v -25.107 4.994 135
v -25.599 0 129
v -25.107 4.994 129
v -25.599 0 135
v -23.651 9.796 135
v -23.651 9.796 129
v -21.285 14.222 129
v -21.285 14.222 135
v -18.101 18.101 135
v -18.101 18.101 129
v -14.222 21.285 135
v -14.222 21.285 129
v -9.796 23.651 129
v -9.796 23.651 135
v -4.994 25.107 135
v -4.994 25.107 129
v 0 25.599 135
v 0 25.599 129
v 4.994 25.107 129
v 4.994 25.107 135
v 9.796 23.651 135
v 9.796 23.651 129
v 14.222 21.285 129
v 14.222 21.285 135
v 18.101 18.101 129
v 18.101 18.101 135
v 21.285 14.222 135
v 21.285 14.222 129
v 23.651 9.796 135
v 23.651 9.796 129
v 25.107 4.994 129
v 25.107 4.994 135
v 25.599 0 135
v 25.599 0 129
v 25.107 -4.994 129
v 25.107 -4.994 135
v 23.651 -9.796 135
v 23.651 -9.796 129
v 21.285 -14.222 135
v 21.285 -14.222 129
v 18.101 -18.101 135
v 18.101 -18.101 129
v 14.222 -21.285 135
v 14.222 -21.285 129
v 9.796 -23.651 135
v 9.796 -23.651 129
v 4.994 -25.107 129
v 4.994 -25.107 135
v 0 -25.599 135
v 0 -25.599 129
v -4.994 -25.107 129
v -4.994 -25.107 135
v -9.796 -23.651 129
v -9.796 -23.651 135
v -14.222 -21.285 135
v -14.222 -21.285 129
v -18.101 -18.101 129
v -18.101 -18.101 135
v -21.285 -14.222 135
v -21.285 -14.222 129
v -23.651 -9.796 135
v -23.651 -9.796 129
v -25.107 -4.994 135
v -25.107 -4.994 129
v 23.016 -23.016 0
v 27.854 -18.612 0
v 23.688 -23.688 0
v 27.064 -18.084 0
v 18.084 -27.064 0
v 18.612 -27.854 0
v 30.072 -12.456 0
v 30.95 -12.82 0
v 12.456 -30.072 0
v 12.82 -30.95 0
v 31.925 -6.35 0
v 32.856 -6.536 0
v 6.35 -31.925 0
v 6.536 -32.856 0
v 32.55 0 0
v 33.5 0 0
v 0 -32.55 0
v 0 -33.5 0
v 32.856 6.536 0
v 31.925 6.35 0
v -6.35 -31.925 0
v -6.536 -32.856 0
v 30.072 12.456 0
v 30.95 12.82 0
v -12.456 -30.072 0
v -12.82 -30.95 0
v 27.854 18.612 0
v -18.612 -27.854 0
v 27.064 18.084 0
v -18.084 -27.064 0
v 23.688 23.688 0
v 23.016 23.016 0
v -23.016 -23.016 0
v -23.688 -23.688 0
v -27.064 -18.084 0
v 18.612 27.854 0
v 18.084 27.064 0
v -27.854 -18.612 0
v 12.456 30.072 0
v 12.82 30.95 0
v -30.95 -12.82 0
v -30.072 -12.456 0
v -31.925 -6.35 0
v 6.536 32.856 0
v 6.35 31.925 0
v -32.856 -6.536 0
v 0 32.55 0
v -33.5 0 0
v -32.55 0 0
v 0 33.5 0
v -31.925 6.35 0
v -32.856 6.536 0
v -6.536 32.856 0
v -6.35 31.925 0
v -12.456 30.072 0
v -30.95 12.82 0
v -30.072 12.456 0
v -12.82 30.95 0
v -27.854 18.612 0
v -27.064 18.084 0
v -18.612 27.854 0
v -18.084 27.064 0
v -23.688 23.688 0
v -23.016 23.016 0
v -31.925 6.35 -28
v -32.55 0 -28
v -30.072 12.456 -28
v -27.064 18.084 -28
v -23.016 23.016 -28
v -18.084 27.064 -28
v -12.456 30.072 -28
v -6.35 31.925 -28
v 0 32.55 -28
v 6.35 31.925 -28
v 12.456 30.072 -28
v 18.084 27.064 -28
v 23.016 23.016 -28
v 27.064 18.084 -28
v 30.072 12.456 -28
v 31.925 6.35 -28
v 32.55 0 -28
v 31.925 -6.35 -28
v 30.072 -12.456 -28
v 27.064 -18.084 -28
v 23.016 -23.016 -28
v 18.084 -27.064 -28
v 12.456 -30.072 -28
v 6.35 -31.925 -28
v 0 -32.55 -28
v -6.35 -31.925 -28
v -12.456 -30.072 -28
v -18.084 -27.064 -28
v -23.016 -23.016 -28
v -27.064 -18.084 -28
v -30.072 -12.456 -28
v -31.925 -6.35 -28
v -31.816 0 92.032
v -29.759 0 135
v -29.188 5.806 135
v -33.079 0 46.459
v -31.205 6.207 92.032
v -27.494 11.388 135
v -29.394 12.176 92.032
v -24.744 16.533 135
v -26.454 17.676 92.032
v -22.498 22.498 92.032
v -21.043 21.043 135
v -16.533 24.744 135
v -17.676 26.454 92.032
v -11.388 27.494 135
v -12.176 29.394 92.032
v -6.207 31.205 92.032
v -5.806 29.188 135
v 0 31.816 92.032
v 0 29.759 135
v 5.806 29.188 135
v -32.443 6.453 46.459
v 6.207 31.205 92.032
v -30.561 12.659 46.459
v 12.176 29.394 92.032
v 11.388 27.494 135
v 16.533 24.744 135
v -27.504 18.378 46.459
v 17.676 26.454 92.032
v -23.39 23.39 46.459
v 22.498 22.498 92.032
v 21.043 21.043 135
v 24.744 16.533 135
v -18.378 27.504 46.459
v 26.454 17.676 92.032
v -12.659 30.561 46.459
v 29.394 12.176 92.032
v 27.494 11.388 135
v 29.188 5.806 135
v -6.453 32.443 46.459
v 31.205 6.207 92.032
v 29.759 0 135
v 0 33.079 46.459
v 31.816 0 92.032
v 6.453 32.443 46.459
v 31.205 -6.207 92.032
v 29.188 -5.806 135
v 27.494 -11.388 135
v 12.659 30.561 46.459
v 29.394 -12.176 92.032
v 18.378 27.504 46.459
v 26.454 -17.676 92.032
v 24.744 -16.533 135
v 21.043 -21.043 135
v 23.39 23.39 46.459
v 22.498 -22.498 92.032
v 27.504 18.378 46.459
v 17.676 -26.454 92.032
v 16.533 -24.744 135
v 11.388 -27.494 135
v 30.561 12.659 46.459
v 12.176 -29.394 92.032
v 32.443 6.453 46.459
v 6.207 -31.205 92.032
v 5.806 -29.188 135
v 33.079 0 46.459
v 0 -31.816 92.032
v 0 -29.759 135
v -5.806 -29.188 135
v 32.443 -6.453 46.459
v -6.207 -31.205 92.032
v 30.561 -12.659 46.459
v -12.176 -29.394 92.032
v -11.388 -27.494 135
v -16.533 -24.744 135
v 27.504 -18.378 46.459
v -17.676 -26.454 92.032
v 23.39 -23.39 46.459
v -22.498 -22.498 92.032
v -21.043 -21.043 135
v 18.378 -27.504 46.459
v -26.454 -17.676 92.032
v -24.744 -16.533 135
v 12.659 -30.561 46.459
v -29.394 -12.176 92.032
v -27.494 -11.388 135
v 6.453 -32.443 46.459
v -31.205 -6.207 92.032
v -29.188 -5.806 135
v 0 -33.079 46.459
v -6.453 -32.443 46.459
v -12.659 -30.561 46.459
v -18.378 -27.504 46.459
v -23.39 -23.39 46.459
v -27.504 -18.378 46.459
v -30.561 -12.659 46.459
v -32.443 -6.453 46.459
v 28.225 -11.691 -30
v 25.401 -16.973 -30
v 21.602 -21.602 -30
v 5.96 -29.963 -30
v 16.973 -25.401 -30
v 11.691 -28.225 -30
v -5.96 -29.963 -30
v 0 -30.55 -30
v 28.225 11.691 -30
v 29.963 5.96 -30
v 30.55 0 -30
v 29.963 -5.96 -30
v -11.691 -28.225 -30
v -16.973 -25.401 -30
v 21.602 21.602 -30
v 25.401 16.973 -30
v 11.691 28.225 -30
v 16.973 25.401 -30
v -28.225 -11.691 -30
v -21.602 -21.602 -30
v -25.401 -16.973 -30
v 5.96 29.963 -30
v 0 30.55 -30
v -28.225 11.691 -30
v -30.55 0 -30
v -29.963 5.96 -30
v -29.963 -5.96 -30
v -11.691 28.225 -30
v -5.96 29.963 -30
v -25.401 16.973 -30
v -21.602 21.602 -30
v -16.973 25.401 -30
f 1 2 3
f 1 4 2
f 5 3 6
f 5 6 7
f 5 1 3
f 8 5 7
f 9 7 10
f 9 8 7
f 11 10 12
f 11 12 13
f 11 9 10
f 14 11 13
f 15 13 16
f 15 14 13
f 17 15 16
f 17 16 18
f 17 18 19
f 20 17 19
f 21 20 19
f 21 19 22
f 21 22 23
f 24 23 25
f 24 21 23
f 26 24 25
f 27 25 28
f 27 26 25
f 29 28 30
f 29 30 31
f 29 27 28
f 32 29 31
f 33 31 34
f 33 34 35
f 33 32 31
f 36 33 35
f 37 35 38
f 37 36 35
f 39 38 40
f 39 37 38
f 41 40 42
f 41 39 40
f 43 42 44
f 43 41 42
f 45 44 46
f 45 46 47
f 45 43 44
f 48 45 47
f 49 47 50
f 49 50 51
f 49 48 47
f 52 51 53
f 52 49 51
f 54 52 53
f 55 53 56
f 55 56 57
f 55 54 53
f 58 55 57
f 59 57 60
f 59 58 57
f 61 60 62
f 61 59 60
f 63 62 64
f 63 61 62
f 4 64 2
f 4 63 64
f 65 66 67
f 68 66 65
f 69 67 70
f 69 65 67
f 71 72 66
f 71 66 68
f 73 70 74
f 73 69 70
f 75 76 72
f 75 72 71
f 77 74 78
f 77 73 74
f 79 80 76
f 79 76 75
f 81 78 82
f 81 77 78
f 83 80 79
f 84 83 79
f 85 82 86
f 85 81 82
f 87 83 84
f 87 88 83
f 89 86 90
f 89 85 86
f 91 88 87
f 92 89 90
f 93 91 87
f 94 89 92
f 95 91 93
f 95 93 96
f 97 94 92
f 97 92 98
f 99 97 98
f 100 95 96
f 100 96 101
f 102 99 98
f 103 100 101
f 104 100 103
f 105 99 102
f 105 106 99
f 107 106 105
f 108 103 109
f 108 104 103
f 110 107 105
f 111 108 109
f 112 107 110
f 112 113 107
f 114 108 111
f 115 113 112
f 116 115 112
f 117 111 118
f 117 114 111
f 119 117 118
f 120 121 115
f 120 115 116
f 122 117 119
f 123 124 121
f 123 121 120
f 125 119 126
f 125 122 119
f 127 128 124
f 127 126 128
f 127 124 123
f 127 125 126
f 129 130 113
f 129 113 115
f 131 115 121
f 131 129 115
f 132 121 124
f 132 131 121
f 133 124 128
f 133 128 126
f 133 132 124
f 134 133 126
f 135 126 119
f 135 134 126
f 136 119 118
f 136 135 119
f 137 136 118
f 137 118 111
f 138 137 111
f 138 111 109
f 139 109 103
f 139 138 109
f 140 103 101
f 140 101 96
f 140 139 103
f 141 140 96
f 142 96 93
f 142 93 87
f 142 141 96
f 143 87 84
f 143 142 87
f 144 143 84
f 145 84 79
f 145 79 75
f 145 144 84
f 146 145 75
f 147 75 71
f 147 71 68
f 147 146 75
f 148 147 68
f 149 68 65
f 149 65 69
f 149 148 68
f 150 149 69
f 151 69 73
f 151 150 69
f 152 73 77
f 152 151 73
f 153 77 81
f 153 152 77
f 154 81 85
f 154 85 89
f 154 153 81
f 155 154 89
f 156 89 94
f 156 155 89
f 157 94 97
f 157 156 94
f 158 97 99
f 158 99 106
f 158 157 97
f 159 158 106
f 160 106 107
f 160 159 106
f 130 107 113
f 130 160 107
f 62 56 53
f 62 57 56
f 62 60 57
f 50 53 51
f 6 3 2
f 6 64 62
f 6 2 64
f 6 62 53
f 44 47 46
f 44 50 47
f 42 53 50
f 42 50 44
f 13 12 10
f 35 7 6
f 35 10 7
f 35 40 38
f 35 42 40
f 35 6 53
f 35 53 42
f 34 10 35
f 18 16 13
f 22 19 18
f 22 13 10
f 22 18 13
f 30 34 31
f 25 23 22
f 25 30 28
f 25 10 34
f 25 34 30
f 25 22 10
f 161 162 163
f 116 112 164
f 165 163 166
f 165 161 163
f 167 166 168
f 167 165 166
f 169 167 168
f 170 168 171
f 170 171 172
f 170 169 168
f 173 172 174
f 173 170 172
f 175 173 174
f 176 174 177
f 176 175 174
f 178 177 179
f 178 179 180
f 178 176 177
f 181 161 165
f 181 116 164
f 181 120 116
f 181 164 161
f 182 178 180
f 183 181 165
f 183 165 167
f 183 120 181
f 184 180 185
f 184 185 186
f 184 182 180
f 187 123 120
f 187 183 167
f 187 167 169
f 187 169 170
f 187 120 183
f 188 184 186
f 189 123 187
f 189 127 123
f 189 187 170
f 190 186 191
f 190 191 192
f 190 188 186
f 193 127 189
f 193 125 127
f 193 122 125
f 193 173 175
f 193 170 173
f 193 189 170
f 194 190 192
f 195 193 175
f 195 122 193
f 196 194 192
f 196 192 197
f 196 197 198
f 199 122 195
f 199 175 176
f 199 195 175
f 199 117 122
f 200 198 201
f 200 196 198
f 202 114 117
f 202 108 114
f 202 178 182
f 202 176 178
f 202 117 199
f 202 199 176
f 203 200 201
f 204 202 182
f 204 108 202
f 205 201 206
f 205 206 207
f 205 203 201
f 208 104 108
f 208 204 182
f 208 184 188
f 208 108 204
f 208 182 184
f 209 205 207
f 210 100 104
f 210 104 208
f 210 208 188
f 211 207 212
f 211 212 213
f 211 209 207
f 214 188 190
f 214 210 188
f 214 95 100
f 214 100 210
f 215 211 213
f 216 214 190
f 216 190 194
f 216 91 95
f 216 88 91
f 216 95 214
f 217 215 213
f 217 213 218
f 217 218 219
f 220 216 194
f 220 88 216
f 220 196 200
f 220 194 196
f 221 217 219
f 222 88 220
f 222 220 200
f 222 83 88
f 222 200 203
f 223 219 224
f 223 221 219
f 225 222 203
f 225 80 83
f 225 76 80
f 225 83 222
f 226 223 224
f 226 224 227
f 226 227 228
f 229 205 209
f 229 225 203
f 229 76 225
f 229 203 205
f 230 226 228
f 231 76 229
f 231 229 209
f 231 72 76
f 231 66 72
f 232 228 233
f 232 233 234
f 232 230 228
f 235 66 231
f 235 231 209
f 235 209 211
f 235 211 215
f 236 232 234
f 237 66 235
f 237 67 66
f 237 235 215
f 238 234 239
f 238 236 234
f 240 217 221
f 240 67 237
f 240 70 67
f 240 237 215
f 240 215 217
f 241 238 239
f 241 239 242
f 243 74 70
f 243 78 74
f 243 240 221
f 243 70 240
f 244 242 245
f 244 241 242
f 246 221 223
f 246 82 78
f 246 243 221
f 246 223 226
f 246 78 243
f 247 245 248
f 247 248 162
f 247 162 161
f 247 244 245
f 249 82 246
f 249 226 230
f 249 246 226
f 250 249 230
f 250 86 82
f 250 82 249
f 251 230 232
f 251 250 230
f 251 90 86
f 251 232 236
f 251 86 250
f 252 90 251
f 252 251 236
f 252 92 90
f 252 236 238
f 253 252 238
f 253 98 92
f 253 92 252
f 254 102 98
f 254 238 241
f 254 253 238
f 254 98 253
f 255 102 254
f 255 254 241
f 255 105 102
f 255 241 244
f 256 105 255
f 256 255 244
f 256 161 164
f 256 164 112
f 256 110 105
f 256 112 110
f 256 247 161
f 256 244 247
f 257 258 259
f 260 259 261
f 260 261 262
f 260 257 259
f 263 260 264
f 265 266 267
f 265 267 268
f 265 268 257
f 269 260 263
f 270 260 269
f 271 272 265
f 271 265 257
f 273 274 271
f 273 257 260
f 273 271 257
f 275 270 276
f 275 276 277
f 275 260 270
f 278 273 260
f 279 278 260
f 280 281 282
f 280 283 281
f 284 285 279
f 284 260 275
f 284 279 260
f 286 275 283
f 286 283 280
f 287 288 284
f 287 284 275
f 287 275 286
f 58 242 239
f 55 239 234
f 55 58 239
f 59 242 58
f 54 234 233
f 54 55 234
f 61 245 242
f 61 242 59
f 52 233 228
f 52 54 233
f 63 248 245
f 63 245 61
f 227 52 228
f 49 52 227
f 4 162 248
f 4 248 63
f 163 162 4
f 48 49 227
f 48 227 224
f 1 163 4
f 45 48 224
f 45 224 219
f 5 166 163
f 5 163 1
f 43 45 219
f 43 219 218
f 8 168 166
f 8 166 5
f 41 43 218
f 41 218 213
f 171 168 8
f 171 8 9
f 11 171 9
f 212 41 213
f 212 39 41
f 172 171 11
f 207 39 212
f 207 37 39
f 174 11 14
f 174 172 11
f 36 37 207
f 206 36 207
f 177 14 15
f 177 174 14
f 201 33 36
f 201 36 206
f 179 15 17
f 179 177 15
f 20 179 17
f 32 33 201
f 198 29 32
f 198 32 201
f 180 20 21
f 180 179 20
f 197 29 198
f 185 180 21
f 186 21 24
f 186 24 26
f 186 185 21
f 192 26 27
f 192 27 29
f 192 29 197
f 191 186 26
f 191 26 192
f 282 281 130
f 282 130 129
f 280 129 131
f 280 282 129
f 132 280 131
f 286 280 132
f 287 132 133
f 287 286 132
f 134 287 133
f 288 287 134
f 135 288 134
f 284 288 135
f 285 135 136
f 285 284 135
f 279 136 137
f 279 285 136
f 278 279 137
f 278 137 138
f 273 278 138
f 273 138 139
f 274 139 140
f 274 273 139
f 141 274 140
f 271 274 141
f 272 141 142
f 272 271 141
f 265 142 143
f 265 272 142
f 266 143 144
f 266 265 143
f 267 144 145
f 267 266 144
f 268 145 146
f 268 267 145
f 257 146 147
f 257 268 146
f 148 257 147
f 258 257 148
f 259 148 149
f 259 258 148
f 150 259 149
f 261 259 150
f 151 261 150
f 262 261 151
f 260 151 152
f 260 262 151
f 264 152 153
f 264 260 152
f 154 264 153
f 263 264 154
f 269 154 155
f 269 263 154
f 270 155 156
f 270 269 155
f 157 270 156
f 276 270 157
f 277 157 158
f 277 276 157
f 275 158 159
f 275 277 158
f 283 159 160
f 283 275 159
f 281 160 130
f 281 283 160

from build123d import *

# Parameters (mm, degrees)
F2_SIZE = 2


with BuildPart() as f1:
    # F0 (on Front) → F1 (revolve)
    with BuildSketch(Plane.XZ):
        with BuildLine():
            Line((-25.5991816521, 135), (-29.7594352231, 135))
            add(Edge.make_bspline(
                [(-29.7594352231, 135), (-33.5, 71.4913116763), (-33.5, 0)],
                knots=[1.0937202801, 1.0937202801, 1.0937202801, 1.5707963268, 1.5707963268, 1.5707963268], degree=2, weights=[1, 0.9716844524, 1]))
            Line((-33.5, 0), (-32.55, 0))
            Line((-32.55, 0), (-32.55, -30))
            Line((-32.55, -30), (0, -30))
            Line((0, -30), (0, 0))
            Line((0, 0), (0, 129))
            Line((0, 129), (-25.5991816521, 129))
            Line((-25.5991816521, 129), (-25.5991816521, 135))
        make_face()
    revolve(axis=Axis((0, 0, -82.5), (0, 0, -1)))

    # F2
    f2_edges = [f1.edges().sort_by_distance(p)[0] for p in [
        (32.55, 0, -30),
    ]]
    chamfer(f2_edges, length=F2_SIZE)


solid = f1.part
